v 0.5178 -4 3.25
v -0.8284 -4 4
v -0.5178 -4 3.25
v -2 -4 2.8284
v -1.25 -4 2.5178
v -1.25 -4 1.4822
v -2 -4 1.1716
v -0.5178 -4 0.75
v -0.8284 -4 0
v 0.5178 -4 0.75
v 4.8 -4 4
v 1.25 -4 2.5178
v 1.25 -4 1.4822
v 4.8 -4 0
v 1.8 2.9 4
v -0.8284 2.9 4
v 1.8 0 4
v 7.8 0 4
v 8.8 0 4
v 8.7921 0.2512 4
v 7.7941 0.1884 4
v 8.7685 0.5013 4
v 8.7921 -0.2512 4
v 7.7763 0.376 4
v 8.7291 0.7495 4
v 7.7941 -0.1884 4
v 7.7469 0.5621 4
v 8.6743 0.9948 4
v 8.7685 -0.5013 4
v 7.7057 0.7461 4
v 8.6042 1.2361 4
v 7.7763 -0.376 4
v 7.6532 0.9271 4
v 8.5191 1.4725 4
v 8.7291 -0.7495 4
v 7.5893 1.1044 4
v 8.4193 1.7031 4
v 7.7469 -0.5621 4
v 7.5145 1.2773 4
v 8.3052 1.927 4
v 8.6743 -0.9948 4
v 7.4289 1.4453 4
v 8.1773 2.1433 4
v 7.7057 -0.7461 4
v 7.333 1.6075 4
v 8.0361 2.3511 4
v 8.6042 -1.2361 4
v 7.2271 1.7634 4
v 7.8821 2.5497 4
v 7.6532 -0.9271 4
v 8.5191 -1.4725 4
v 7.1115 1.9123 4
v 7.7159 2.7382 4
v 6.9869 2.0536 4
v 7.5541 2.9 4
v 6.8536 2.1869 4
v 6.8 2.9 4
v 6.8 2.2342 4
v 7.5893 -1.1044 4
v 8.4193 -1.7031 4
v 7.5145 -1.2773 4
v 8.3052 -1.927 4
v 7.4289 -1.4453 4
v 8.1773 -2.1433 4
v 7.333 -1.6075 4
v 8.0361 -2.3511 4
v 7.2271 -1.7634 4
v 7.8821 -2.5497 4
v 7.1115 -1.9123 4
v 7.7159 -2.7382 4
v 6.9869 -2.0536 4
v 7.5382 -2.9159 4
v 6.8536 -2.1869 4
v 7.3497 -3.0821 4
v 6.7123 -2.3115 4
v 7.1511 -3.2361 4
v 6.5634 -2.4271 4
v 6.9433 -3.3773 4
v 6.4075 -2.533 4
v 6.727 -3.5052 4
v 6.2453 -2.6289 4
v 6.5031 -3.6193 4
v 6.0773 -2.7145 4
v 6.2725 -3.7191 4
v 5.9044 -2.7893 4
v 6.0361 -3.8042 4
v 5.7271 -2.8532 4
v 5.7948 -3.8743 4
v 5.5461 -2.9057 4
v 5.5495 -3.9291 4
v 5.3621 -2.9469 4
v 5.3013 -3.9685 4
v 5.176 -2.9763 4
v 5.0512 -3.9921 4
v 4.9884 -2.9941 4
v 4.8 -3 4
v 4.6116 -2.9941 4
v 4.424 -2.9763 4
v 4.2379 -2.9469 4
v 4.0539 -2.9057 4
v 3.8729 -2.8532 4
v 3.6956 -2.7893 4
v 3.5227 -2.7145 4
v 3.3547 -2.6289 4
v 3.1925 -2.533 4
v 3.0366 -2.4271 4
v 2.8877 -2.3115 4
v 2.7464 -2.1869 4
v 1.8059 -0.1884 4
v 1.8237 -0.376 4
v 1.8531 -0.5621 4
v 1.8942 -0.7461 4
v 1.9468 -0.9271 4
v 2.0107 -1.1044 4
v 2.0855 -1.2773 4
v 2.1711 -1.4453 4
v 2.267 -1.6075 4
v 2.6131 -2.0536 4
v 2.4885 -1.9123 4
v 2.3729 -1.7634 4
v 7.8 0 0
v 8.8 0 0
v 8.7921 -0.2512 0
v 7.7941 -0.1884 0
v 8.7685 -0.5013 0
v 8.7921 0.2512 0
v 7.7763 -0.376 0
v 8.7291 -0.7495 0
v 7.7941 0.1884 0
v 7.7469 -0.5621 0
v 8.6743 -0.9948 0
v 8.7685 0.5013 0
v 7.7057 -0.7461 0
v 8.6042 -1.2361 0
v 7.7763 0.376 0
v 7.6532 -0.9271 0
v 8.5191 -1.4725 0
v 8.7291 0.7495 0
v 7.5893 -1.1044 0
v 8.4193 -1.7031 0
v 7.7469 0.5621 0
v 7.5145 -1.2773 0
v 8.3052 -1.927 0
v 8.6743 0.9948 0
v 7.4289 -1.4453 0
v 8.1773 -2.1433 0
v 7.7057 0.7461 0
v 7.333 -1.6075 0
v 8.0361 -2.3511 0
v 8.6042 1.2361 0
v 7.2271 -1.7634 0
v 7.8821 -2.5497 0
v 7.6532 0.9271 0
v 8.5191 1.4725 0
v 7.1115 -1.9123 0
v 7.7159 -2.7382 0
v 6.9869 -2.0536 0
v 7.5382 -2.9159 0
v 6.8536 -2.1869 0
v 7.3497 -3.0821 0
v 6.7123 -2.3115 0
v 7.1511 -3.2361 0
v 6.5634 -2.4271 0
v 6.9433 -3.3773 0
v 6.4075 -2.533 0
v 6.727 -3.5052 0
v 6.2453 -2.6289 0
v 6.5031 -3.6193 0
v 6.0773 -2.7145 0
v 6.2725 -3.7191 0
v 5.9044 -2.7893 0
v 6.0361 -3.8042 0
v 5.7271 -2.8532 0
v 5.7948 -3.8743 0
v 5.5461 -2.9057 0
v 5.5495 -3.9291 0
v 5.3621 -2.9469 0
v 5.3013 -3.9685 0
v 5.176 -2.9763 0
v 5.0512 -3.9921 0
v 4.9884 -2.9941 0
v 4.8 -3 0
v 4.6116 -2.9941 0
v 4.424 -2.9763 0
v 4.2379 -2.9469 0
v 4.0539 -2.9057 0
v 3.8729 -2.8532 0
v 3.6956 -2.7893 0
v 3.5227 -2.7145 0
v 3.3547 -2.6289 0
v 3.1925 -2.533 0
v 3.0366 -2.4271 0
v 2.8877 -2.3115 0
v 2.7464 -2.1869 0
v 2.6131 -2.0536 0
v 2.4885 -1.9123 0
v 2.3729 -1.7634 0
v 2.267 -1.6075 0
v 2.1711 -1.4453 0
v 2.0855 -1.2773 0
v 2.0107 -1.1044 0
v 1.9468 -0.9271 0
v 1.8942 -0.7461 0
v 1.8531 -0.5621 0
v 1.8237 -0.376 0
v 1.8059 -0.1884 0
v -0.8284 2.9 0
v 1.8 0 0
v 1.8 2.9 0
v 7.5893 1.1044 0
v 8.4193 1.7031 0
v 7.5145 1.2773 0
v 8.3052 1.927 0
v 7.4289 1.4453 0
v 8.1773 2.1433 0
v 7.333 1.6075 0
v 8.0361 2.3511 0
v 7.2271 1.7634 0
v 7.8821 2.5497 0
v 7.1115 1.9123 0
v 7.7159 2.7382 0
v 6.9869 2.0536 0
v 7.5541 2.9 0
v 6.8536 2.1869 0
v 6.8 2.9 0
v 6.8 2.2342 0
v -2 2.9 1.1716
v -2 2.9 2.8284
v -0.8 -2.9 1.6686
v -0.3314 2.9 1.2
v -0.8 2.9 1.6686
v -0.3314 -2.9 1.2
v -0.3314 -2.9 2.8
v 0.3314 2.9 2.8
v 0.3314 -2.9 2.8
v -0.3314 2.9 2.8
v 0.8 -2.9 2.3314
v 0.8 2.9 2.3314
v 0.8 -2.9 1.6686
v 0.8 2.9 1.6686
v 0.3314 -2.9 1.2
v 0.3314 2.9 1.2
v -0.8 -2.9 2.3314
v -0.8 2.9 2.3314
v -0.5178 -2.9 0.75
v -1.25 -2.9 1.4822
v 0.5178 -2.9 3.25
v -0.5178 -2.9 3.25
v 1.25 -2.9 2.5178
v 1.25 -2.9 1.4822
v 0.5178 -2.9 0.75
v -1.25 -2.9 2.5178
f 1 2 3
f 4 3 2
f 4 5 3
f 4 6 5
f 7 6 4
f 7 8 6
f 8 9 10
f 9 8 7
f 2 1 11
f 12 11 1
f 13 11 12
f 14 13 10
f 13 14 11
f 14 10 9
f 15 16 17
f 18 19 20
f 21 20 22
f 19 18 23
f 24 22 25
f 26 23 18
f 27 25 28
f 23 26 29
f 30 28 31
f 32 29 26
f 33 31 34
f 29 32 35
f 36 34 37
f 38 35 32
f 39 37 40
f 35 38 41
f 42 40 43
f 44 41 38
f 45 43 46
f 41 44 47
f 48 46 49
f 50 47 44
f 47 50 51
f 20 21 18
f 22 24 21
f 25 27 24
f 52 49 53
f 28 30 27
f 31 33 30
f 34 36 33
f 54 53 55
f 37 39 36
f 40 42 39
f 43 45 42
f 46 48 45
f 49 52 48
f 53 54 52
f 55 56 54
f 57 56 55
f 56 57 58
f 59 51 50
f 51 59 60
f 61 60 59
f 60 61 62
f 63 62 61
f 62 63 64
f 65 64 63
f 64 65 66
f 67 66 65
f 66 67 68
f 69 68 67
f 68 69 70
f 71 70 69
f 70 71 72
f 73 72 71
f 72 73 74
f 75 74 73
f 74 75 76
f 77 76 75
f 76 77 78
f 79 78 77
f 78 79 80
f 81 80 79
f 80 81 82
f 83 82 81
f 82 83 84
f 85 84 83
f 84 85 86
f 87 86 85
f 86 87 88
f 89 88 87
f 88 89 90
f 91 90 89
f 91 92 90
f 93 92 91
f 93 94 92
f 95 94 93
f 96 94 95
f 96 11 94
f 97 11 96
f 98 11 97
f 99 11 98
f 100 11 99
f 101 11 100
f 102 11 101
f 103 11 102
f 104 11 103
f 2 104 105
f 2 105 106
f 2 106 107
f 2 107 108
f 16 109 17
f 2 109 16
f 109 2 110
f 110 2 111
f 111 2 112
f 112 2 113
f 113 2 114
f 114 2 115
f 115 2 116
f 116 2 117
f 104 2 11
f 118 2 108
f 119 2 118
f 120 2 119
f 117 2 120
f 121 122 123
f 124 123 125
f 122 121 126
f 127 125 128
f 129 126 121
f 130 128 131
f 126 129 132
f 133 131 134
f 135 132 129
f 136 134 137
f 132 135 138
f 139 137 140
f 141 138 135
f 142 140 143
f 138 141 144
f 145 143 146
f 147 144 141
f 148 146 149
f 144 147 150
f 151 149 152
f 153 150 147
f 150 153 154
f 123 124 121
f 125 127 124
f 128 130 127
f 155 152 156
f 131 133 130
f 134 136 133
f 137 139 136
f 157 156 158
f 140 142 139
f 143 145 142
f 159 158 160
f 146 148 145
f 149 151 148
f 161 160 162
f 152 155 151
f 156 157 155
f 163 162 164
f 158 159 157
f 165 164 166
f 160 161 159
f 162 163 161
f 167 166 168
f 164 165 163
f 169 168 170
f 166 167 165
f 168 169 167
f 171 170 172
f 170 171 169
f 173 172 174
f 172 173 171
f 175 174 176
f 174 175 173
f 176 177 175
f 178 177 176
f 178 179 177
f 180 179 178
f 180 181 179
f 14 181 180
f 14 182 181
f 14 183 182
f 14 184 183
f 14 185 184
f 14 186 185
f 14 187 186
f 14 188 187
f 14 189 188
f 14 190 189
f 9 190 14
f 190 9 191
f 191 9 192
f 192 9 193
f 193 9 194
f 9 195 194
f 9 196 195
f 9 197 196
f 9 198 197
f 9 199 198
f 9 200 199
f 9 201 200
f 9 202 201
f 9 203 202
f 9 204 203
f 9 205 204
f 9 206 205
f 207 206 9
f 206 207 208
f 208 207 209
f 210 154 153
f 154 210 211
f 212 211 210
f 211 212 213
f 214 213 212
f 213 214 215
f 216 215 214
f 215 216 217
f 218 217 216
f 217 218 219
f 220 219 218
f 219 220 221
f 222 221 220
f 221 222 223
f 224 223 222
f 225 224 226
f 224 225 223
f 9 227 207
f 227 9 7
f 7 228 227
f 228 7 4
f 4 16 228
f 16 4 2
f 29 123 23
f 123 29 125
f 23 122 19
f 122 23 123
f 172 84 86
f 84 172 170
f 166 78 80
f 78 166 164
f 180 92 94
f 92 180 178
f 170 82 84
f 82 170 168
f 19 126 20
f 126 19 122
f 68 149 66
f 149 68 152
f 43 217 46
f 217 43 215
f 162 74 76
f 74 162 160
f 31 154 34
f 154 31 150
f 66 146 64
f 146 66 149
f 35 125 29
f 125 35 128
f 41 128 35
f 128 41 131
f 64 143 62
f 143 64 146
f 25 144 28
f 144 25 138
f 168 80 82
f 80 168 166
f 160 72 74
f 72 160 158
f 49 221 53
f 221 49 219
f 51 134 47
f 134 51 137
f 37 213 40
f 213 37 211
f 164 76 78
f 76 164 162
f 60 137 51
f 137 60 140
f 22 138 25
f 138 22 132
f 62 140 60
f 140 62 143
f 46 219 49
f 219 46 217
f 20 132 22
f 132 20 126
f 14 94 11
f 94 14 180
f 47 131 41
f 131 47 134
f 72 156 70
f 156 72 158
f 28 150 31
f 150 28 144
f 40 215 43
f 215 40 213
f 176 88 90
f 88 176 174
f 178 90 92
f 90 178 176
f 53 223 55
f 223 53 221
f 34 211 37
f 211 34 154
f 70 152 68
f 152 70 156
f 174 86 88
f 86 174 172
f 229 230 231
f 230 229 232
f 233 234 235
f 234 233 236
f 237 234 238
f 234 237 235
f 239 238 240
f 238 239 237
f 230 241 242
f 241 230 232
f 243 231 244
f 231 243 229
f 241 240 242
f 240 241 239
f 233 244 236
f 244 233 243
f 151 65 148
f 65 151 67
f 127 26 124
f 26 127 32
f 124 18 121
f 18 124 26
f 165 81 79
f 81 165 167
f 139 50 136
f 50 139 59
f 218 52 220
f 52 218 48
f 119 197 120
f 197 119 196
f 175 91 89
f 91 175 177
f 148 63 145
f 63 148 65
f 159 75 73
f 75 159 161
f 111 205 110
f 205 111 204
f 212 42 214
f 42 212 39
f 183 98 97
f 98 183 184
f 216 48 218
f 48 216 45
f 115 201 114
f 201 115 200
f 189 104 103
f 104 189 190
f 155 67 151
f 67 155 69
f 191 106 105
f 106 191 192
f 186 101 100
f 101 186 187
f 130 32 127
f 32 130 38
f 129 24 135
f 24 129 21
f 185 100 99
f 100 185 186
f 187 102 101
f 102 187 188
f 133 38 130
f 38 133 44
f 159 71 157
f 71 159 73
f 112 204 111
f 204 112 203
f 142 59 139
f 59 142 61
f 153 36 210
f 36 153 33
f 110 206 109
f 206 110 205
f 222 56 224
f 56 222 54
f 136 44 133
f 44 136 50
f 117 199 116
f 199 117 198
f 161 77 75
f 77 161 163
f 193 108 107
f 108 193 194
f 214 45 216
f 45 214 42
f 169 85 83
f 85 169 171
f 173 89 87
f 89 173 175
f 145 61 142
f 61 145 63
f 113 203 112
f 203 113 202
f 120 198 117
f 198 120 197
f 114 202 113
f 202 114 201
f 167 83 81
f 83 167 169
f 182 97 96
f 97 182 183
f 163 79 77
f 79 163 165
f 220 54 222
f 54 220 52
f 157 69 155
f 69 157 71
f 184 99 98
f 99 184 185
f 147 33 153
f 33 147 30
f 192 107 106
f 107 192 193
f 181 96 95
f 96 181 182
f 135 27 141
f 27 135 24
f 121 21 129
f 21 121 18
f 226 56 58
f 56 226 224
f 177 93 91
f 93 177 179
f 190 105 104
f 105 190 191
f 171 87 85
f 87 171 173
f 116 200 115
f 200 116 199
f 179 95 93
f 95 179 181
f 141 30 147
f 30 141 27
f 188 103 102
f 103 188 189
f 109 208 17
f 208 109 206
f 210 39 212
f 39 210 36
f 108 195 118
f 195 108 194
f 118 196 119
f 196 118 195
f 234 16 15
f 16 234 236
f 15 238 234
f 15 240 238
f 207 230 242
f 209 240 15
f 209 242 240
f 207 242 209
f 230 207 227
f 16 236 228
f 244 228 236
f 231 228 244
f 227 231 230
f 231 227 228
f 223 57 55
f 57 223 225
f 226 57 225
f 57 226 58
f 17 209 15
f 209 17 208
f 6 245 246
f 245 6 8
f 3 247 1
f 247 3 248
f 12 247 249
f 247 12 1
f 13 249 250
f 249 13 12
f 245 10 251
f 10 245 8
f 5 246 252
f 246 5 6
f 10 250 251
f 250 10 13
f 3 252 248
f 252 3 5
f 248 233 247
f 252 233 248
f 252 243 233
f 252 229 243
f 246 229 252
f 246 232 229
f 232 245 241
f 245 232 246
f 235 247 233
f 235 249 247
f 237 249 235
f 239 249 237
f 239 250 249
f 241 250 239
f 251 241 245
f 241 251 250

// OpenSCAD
// ************* Credits part *************

// "Customizable Cable Holder" 

// Programmed by Fryns - September 2014

// Optimized for Customizer 

// ************* Declaration part *************

/* [Dimensions] */
// Width of hanger in mm
Width=4;
NailDiameter=1.6; // Nail or Screw Diameter
CableDiameter=6.0;
Thickness=1;

/* [Advanced] */
CutLengthBottom=0.1; // from -Thickness to CableDiameter
CutLengthSide=1; // from 0 to CableDiameter
Resolution=100; //[20:Draft,50:Medium,100:Fine, 200:very fine]
Geometry=8; //[8:Obey rule of 45,100:Fine, 200:very fine]

/* [Countersink] */
NailHeadDiameter=2.5;
CountersinkDepth=1.2;
Countersink="Normal"; // [Normal,No Countersink,Angle]

/* [Hidden] */
Manifoldfix=0.1;

// ************* Executable part *************
translate([0,0,Width/2])
rotate(a=[90,0,0])
difference(){
	BaseVolume();
	CutVolume();
	if (Countersink=="Angle") CountersinkAngle();
	if (Countersink=="Normal") Countersink();
}

// ************* Module part *************

module BaseVolume(){
//Base ensuring plane top
   translate([(NailDiameter/2+CableDiameter/2+Thickness)/2,0,0])
		cube(size = [NailDiameter/2+CableDiameter/2+Thickness,Width,CableDiameter+2*Thickness], center = true);

//Base head for Nail
	rotate(a=[0,0,360/(Geometry*2)])
		cylinder(h = CableDiameter+2*Thickness, r = Width/2/cos(360/(Geometry*2)),$fn=Geometry, center = true);

//Base for cable
   translate([NailDiameter/2+CableDiameter/2+Thickness,0,0])
		rotate(a=[90,0,0])
			cylinder(h = Width, r = (CableDiameter+2*Thickness)/2,$fn=Resolution, center = true);
}

module CutVolume(){
// cut-cylinder for Nail
	rotate(a=[0,0,360/(8*2)])
		cylinder(h = CableDiameter+2*Thickness+Manifoldfix, r = NailDiameter/2/cos(360/(Geometry*2)),$fn=Geometry, center = true);

// cut-cylinder for cable
   translate([NailDiameter/2+CableDiameter/2+Thickness,0,0])
		rotate(a=[90,0,0])
		cylinder(h = Width+2*Manifoldfix, r = (CableDiameter)/2,$fn=Resolution, center = true);

// cut-cube Bottom
   translate([(Width+CableDiameter+2*Thickness)/2-Width/2-Manifoldfix,0,CutLengthBottom+Thickness-(CableDiameter+2*Thickness)])
		cube(size = [Width+CableDiameter+2*Thickness,Width+Manifoldfix,CableDiameter+2*Thickness], center = true);

// cut-cube Side
   translate([NailDiameter/2+(CableDiameter-CutLengthSide)/2+Thickness,0,-(CableDiameter+2*Thickness)/2])
		cube(size = [CableDiameter-CutLengthSide,Width+Manifoldfix,CableDiameter+2*Thickness], center = true);
}

module Countersink(){	// Normal countersink for nail head
   translate([0,0,(CableDiameter+2*Thickness)/2-CountersinkDepth+Manifoldfix])
		rotate(a=[0,0,360/(Geometry*2)])
			cylinder(h = CountersinkDepth, r = NailHeadDiameter/2/cos(360/(Geometry*2)),$fn=Geometry, center = false);
}

module CountersinkAngle(){ // Angle countersink for screw head
   translate([0,0,(CableDiameter+2*Thickness)/2-(NailHeadDiameter/2-NailDiameter/2)+Manifoldfix])
		cylinder(h = NailHeadDiameter/2-NailDiameter/2, r1 = NailDiameter/2,r2 = NailHeadDiameter/2,$fn=Resolution, center = false);
}
